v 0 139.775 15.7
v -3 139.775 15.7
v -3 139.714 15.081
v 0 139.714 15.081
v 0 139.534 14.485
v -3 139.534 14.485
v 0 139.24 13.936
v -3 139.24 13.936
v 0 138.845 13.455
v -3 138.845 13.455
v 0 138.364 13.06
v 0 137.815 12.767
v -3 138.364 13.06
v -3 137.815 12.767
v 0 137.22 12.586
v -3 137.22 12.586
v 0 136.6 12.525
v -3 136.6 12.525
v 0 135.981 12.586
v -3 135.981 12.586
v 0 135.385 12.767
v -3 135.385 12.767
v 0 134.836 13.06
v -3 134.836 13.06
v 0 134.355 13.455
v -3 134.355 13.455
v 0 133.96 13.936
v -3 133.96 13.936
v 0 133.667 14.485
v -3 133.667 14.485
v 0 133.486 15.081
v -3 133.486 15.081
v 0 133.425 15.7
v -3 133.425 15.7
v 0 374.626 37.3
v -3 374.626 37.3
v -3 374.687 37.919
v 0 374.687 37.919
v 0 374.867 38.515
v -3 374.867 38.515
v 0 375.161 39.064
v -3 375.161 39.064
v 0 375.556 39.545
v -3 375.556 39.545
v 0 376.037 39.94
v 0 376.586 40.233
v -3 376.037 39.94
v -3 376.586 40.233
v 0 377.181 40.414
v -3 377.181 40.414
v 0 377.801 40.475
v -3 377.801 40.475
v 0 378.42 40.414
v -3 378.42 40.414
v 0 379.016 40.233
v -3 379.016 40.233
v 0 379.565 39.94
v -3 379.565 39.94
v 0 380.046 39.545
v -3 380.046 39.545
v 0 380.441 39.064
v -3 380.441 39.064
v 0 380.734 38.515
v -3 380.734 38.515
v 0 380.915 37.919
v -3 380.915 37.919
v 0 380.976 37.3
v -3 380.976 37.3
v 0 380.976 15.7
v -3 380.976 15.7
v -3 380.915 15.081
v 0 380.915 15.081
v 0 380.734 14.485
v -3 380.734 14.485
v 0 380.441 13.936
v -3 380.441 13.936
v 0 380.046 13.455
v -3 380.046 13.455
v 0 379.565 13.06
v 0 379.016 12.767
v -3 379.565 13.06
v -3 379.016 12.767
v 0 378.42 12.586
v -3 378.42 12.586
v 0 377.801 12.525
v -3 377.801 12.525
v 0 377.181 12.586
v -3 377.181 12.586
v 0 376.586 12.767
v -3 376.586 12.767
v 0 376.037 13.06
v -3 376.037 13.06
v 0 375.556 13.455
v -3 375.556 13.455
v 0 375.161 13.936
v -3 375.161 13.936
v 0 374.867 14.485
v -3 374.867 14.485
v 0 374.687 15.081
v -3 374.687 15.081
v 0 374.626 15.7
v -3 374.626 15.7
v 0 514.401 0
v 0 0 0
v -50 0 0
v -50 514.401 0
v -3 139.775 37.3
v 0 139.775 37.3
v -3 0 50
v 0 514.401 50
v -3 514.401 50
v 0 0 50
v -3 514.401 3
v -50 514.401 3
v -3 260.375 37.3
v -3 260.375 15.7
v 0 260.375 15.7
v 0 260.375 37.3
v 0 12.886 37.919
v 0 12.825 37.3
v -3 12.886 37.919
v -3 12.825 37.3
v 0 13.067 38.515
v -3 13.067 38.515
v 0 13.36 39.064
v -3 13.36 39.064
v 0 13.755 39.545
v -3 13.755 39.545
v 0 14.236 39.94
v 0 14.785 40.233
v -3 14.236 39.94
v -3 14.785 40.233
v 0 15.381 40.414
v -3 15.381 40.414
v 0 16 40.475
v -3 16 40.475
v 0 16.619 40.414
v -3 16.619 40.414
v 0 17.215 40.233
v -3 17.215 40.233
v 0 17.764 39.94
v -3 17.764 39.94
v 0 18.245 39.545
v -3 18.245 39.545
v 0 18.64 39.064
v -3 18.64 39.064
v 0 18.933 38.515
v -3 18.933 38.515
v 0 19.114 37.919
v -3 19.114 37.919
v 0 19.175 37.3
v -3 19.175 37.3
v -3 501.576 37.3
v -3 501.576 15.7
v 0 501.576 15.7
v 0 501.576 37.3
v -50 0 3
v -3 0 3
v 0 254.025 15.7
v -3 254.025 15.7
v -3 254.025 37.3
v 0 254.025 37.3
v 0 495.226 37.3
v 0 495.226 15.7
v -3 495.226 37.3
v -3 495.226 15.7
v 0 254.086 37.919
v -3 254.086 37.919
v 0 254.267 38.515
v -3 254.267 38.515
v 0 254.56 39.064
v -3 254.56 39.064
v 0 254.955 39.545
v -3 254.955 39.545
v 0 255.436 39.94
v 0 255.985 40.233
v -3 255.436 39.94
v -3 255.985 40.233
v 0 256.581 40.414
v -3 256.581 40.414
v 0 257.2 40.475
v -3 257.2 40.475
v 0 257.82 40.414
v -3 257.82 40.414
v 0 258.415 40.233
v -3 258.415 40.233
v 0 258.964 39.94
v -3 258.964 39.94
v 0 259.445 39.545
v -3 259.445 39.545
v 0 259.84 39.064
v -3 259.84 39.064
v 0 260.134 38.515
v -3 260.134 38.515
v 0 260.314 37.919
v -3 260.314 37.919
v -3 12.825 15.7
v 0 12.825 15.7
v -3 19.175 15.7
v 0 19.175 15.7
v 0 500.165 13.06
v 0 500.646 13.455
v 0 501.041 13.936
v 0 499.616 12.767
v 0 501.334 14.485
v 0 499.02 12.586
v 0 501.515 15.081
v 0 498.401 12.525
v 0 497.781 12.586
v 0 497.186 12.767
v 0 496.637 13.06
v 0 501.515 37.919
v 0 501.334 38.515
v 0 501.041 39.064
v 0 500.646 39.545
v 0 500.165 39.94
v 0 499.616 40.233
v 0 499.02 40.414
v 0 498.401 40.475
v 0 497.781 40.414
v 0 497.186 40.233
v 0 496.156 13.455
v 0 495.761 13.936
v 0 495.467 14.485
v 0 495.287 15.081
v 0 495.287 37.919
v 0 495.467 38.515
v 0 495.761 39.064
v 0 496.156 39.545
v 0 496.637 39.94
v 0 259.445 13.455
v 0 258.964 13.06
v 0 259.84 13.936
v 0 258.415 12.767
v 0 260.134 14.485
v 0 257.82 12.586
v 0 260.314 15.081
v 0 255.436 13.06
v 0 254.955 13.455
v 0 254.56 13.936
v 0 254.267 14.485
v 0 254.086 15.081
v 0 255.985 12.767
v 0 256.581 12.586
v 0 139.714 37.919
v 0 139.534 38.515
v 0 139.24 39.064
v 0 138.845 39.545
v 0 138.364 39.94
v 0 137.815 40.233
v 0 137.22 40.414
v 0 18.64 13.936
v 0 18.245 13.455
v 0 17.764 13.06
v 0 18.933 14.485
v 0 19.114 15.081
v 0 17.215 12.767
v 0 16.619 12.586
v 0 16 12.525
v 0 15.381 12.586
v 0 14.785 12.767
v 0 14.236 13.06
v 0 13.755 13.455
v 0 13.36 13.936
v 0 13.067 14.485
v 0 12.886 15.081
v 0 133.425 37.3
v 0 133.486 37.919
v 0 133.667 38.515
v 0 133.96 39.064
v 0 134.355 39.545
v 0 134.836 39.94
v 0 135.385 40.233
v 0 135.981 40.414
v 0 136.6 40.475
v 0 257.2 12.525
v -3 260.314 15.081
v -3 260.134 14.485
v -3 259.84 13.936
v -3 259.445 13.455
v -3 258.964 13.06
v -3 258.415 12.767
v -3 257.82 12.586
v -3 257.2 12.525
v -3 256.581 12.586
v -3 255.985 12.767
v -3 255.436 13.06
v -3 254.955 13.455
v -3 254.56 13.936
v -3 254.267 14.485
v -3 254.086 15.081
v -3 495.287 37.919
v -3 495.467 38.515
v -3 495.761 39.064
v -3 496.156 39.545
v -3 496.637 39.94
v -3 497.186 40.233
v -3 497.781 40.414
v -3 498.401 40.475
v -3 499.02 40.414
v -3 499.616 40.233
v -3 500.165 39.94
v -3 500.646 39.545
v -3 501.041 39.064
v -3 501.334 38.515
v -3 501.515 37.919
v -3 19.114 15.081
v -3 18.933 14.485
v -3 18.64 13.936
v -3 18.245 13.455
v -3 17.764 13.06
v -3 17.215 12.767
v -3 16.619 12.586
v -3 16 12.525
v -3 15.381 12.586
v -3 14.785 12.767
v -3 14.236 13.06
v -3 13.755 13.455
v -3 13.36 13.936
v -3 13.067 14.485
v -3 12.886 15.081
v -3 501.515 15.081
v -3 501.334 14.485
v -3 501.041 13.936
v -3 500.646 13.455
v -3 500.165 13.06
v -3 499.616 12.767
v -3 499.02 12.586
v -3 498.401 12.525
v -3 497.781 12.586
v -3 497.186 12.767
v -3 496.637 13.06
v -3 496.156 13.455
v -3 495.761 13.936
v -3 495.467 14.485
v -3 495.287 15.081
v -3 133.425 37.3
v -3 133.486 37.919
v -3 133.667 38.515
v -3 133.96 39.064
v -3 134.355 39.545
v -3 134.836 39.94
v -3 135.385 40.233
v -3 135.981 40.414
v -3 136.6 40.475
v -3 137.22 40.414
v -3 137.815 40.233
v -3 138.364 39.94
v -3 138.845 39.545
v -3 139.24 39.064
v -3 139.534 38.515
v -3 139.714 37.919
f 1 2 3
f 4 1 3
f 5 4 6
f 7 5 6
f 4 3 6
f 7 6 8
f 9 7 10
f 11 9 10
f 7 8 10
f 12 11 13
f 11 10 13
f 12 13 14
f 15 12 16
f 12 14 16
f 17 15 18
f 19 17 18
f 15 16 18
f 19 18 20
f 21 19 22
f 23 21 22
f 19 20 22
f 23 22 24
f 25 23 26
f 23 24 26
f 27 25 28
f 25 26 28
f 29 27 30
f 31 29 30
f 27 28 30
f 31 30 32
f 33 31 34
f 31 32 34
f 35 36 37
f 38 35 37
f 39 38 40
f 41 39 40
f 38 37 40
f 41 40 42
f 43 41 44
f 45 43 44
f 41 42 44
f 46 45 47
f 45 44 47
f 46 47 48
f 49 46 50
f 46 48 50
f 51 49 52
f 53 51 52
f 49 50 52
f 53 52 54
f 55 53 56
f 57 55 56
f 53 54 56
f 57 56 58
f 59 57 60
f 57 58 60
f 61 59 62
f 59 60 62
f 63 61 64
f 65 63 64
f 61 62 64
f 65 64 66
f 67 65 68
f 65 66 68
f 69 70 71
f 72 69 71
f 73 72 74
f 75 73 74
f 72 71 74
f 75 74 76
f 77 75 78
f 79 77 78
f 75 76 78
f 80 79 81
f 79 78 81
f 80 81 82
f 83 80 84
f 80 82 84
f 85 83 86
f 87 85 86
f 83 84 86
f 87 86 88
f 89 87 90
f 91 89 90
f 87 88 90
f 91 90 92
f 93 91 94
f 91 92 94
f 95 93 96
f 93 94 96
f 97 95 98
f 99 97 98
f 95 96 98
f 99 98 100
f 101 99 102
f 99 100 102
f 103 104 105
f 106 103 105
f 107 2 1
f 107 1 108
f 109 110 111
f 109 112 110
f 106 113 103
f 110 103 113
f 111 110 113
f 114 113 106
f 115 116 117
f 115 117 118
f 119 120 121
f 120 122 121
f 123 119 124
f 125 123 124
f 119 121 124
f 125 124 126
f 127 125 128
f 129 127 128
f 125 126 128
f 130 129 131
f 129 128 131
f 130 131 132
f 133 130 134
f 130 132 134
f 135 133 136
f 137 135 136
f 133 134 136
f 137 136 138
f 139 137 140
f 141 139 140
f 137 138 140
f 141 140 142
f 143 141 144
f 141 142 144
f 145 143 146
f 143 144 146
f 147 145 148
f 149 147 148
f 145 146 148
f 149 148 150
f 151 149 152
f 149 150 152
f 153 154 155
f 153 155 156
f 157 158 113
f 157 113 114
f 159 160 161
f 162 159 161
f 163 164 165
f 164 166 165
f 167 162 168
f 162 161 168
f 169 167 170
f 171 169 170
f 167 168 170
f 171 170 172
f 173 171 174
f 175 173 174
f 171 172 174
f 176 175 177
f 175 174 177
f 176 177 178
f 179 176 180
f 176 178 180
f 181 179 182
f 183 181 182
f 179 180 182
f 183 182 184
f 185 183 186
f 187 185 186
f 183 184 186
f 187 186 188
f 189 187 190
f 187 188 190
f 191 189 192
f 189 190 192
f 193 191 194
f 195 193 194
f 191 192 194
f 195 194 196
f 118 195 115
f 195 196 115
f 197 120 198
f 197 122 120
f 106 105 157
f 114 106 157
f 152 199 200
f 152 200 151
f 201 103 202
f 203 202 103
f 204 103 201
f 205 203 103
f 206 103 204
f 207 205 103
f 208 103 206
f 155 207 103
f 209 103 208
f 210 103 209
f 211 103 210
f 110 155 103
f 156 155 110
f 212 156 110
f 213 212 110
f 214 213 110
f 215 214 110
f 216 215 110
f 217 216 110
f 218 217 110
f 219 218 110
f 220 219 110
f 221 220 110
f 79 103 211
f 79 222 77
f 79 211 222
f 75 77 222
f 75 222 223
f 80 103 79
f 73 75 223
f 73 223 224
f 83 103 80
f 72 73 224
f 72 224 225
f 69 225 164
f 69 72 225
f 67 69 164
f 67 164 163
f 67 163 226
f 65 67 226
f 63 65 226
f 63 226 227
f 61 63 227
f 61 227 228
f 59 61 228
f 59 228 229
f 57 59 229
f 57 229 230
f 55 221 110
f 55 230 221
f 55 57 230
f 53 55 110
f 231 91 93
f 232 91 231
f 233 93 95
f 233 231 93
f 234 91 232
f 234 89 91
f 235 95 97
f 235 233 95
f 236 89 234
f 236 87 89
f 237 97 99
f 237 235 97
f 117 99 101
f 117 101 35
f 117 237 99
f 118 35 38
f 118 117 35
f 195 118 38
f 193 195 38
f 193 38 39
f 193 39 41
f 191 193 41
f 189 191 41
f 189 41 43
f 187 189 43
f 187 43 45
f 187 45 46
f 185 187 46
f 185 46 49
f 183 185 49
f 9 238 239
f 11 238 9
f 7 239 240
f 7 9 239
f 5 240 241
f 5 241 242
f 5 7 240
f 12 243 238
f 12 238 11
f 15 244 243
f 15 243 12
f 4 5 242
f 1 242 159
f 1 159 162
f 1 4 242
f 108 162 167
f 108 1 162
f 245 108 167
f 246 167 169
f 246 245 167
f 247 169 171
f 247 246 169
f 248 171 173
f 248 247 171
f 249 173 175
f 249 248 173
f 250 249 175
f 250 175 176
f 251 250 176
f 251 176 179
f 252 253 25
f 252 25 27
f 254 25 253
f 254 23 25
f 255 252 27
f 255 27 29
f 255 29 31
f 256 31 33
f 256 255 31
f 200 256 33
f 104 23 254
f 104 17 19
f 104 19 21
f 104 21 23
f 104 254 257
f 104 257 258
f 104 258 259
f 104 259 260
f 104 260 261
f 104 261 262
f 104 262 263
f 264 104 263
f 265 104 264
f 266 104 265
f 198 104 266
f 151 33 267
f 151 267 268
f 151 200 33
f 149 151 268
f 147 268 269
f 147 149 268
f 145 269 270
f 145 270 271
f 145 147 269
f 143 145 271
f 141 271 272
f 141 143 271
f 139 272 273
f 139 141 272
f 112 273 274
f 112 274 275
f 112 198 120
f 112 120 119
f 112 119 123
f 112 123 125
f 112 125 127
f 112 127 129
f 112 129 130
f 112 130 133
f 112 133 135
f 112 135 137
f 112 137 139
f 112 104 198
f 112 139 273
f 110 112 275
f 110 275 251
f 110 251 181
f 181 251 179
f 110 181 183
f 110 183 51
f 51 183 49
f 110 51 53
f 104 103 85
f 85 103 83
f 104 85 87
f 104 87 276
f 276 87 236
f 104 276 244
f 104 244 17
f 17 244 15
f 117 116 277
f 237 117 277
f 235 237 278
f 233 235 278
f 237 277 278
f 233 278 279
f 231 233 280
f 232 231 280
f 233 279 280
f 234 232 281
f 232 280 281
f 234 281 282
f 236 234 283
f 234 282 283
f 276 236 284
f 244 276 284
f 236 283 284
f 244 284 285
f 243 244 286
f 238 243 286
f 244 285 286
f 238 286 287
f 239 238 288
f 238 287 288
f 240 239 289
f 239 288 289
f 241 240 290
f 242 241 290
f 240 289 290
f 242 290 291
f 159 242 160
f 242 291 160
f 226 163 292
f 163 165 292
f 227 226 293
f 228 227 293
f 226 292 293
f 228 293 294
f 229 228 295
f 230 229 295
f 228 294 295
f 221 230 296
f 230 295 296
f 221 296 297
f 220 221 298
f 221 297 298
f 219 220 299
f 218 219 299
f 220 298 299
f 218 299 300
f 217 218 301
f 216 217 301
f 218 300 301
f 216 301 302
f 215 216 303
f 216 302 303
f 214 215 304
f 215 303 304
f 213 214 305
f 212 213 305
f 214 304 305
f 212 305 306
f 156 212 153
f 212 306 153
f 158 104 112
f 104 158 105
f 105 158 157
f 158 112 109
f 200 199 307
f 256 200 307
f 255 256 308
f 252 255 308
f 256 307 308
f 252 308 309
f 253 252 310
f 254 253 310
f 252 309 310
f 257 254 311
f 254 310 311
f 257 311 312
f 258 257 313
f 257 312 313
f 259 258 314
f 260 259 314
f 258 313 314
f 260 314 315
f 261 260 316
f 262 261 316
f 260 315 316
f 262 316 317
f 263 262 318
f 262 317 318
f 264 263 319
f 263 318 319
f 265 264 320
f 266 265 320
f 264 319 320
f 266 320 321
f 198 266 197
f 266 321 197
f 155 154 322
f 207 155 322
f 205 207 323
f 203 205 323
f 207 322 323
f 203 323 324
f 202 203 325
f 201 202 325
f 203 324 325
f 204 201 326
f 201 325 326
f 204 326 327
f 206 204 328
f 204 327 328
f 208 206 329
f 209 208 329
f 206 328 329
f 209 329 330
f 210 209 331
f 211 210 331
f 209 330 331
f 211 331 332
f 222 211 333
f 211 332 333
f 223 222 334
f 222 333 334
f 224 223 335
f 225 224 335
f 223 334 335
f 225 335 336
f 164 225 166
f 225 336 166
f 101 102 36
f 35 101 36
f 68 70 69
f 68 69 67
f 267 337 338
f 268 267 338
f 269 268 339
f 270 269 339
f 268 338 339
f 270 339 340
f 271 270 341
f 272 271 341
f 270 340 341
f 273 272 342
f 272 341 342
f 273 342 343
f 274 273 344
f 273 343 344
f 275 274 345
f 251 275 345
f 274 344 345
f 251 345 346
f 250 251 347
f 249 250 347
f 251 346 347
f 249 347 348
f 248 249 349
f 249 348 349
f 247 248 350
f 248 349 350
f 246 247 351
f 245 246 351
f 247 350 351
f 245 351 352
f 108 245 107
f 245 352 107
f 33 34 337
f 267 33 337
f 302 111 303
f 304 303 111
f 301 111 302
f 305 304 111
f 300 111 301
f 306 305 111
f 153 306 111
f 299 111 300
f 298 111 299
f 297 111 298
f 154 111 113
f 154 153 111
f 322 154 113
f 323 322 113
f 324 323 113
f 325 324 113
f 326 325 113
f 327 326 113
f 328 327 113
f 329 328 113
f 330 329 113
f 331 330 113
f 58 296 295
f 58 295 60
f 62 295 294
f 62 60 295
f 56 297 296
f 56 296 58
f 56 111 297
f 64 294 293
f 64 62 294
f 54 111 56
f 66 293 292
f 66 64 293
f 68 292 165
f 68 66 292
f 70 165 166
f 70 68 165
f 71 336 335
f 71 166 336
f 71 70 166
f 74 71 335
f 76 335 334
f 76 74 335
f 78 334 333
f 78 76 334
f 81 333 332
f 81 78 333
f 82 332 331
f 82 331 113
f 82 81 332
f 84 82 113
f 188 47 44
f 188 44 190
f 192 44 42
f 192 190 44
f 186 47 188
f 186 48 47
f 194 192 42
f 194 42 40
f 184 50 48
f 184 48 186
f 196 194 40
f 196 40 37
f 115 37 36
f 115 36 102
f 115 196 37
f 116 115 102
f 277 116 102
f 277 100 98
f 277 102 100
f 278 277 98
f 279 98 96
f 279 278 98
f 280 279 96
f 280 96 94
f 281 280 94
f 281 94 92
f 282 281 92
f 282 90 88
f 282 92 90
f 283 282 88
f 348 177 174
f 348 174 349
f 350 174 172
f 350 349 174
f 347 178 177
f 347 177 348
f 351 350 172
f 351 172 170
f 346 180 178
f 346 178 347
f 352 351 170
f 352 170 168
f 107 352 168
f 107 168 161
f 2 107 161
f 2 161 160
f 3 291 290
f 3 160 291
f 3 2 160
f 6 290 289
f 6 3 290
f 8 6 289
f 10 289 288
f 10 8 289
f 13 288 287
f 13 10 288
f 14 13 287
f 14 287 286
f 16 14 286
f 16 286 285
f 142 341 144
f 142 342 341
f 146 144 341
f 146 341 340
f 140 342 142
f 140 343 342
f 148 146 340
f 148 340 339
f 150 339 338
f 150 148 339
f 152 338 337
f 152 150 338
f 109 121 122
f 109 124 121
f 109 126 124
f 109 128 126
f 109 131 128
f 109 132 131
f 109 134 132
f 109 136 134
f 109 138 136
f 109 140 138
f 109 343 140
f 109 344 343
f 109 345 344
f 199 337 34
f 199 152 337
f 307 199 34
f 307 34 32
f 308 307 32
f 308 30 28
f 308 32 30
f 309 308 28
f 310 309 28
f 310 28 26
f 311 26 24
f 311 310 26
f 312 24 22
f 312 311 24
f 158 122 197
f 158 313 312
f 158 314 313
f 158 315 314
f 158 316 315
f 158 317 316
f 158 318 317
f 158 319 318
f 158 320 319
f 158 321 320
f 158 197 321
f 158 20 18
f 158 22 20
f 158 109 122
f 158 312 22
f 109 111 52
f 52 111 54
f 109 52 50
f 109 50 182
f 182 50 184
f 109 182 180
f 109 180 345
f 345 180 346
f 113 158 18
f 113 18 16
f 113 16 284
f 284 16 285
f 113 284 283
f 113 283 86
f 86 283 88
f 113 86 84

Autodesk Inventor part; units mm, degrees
ref_plane "YZ Plane" through (0, 0, 0) normal (1, 0, 0) x (0, 1, 0)
ref_plane "XZ Plane" through (0, 0, 0) normal (0, 1, 0) x (-1, 0, 0)
ref_plane "XY Plane" through (0, 0, 0) normal (0, 0, 1) x (1, 0, 0)
sketch "Sketch1" plane through (0, 0, 0) normal (0, 1, 0) x (-1, 0, 0)
  line L0 (0, 0) -> (50, 0)
  line L1 (50, 0) -> (50, 3)
  line L2 (0, 0) -> (0, 50)
  line L3 (0, 50) -> (3, 50)
  line L4 (3, 50) -> (3, 3)
  line L5 (3, 3) -> (50, 3)
  dimension "d0" = 50
  dimension "d1" = 3
  dimension "d2" = 50
  dimension "d3" = 3
extrude "Extrusion1" add sketch "Sketch1" along normal blind 514.4008
sketch "Sketch2" plane through (-3, 0, 3) normal (-1, 0, 0) x (0, 0, 1)
  line L0 (0, 514.4008) -> (47, 514.4008) projected
  line L1 (0, 0) -> (47, 0) projected
  line L2 (47, 0) -> (47, 514.4008) projected
  line L3 (0, 0) -> (0, 514.4008) projected
  line L4 (-3, 0) -> (-3, 514.4008) projected
  line L5 (-3, 0) -> (0, 0) projected
  line L6 (-3, 514.4008) -> (0, 514.4008) projected
  line L7 (12.7, 498.4008) -> (34.3, 498.4008) construction
  line L8 (12.7, 501.5758) -> (34.3, 501.5758)
  line L9 (12.7, 495.2258) -> (34.3, 495.2258)
  arc A0 (12.7, 501.5758) -> (12.7, 495.2258) centre (12.7, 498.4008) ccw
  arc A1 (34.3, 495.2258) -> (34.3, 501.5758) centre (34.3, 498.4008) ccw
  line L10 (12.7, 19.175) -> (34.3, 19.175)
  line L11 (34.3, 12.825) -> (12.7, 12.825)
  line L12 (12.7, 16) -> (34.3, 16) construction
  arc A2 (12.7, 19.175) -> (12.7, 12.825) centre (12.7, 16) ccw
  arc A3 (34.3, 12.825) -> (34.3, 19.175) centre (34.3, 16) ccw
  line L13 (12.7, 136.6002) -> (34.3, 136.6002) construction
  line L14 (12.7, 139.7752) -> (34.3, 139.7752)
  line L15 (12.7, 133.4252) -> (34.3, 133.4252)
  arc A4 (12.7, 139.7752) -> (12.7, 133.4252) centre (12.7, 136.6002) ccw
  arc A5 (34.3, 133.4252) -> (34.3, 139.7752) centre (34.3, 136.6002) ccw
  line L16 (12.7, 377.8006) -> (34.3, 377.8006) construction
  line L17 (12.7, 380.9756) -> (34.3, 380.9756)
  line L18 (12.7, 374.6256) -> (34.3, 374.6256)
  arc A6 (12.7, 380.9756) -> (12.7, 374.6256) centre (12.7, 377.8006) ccw
  arc A7 (34.3, 374.6256) -> (34.3, 380.9756) centre (34.3, 377.8006) ccw
  line L19 (12.7, 257.2004) -> (34.3, 257.2004) construction
  line L20 (12.7, 260.3754) -> (34.3, 260.3754)
  line L21 (12.7, 254.0254) -> (34.3, 254.0254)
  arc A8 (12.7, 260.3754) -> (12.7, 254.0254) centre (12.7, 257.2004) ccw
  arc A9 (34.3, 254.0254) -> (34.3, 260.3754) centre (34.3, 257.2004) ccw
  dimension "d58" = 12.7
  dimension "d59" = 12.7
  dimension "d60" = 3.175
  dimension "d61" = 6.35
  dimension "d62" = 6.35
  dimension "d63" = 3.175
  dimension "d70" = 16
  dimension "d73" = 16
  dimension "d74" = 3.175
  dimension "d75" = 6.35
  dimension "d76" = 3.175
  dimension "d77" = 6.35
  dimension "d78" = 3.175
  dimension "d79" = 6.35
  dimension "d80" = 482.4008
  dimension "d81" = 120.6002
  dimension "d82" = 120.6002
  dimension "d83" = 120.6002
extrude "Extrusion3" cut sketch "Sketch2" against normal blind 3 contours L8 A1 L9 A0 | L10 A3 L11 A2 | L14 A5 L15 A4 | L17 A7 L18 A6 | L20 A9 L21 A8
equation "\"d73\" = d70"
equation "\"d81\" = 0.25 * d80"
equation "\"d82\" = d81"
equation "\"d83\" = d82"
properties part number "26in Angle Channel" material "Aluminum 6061"
